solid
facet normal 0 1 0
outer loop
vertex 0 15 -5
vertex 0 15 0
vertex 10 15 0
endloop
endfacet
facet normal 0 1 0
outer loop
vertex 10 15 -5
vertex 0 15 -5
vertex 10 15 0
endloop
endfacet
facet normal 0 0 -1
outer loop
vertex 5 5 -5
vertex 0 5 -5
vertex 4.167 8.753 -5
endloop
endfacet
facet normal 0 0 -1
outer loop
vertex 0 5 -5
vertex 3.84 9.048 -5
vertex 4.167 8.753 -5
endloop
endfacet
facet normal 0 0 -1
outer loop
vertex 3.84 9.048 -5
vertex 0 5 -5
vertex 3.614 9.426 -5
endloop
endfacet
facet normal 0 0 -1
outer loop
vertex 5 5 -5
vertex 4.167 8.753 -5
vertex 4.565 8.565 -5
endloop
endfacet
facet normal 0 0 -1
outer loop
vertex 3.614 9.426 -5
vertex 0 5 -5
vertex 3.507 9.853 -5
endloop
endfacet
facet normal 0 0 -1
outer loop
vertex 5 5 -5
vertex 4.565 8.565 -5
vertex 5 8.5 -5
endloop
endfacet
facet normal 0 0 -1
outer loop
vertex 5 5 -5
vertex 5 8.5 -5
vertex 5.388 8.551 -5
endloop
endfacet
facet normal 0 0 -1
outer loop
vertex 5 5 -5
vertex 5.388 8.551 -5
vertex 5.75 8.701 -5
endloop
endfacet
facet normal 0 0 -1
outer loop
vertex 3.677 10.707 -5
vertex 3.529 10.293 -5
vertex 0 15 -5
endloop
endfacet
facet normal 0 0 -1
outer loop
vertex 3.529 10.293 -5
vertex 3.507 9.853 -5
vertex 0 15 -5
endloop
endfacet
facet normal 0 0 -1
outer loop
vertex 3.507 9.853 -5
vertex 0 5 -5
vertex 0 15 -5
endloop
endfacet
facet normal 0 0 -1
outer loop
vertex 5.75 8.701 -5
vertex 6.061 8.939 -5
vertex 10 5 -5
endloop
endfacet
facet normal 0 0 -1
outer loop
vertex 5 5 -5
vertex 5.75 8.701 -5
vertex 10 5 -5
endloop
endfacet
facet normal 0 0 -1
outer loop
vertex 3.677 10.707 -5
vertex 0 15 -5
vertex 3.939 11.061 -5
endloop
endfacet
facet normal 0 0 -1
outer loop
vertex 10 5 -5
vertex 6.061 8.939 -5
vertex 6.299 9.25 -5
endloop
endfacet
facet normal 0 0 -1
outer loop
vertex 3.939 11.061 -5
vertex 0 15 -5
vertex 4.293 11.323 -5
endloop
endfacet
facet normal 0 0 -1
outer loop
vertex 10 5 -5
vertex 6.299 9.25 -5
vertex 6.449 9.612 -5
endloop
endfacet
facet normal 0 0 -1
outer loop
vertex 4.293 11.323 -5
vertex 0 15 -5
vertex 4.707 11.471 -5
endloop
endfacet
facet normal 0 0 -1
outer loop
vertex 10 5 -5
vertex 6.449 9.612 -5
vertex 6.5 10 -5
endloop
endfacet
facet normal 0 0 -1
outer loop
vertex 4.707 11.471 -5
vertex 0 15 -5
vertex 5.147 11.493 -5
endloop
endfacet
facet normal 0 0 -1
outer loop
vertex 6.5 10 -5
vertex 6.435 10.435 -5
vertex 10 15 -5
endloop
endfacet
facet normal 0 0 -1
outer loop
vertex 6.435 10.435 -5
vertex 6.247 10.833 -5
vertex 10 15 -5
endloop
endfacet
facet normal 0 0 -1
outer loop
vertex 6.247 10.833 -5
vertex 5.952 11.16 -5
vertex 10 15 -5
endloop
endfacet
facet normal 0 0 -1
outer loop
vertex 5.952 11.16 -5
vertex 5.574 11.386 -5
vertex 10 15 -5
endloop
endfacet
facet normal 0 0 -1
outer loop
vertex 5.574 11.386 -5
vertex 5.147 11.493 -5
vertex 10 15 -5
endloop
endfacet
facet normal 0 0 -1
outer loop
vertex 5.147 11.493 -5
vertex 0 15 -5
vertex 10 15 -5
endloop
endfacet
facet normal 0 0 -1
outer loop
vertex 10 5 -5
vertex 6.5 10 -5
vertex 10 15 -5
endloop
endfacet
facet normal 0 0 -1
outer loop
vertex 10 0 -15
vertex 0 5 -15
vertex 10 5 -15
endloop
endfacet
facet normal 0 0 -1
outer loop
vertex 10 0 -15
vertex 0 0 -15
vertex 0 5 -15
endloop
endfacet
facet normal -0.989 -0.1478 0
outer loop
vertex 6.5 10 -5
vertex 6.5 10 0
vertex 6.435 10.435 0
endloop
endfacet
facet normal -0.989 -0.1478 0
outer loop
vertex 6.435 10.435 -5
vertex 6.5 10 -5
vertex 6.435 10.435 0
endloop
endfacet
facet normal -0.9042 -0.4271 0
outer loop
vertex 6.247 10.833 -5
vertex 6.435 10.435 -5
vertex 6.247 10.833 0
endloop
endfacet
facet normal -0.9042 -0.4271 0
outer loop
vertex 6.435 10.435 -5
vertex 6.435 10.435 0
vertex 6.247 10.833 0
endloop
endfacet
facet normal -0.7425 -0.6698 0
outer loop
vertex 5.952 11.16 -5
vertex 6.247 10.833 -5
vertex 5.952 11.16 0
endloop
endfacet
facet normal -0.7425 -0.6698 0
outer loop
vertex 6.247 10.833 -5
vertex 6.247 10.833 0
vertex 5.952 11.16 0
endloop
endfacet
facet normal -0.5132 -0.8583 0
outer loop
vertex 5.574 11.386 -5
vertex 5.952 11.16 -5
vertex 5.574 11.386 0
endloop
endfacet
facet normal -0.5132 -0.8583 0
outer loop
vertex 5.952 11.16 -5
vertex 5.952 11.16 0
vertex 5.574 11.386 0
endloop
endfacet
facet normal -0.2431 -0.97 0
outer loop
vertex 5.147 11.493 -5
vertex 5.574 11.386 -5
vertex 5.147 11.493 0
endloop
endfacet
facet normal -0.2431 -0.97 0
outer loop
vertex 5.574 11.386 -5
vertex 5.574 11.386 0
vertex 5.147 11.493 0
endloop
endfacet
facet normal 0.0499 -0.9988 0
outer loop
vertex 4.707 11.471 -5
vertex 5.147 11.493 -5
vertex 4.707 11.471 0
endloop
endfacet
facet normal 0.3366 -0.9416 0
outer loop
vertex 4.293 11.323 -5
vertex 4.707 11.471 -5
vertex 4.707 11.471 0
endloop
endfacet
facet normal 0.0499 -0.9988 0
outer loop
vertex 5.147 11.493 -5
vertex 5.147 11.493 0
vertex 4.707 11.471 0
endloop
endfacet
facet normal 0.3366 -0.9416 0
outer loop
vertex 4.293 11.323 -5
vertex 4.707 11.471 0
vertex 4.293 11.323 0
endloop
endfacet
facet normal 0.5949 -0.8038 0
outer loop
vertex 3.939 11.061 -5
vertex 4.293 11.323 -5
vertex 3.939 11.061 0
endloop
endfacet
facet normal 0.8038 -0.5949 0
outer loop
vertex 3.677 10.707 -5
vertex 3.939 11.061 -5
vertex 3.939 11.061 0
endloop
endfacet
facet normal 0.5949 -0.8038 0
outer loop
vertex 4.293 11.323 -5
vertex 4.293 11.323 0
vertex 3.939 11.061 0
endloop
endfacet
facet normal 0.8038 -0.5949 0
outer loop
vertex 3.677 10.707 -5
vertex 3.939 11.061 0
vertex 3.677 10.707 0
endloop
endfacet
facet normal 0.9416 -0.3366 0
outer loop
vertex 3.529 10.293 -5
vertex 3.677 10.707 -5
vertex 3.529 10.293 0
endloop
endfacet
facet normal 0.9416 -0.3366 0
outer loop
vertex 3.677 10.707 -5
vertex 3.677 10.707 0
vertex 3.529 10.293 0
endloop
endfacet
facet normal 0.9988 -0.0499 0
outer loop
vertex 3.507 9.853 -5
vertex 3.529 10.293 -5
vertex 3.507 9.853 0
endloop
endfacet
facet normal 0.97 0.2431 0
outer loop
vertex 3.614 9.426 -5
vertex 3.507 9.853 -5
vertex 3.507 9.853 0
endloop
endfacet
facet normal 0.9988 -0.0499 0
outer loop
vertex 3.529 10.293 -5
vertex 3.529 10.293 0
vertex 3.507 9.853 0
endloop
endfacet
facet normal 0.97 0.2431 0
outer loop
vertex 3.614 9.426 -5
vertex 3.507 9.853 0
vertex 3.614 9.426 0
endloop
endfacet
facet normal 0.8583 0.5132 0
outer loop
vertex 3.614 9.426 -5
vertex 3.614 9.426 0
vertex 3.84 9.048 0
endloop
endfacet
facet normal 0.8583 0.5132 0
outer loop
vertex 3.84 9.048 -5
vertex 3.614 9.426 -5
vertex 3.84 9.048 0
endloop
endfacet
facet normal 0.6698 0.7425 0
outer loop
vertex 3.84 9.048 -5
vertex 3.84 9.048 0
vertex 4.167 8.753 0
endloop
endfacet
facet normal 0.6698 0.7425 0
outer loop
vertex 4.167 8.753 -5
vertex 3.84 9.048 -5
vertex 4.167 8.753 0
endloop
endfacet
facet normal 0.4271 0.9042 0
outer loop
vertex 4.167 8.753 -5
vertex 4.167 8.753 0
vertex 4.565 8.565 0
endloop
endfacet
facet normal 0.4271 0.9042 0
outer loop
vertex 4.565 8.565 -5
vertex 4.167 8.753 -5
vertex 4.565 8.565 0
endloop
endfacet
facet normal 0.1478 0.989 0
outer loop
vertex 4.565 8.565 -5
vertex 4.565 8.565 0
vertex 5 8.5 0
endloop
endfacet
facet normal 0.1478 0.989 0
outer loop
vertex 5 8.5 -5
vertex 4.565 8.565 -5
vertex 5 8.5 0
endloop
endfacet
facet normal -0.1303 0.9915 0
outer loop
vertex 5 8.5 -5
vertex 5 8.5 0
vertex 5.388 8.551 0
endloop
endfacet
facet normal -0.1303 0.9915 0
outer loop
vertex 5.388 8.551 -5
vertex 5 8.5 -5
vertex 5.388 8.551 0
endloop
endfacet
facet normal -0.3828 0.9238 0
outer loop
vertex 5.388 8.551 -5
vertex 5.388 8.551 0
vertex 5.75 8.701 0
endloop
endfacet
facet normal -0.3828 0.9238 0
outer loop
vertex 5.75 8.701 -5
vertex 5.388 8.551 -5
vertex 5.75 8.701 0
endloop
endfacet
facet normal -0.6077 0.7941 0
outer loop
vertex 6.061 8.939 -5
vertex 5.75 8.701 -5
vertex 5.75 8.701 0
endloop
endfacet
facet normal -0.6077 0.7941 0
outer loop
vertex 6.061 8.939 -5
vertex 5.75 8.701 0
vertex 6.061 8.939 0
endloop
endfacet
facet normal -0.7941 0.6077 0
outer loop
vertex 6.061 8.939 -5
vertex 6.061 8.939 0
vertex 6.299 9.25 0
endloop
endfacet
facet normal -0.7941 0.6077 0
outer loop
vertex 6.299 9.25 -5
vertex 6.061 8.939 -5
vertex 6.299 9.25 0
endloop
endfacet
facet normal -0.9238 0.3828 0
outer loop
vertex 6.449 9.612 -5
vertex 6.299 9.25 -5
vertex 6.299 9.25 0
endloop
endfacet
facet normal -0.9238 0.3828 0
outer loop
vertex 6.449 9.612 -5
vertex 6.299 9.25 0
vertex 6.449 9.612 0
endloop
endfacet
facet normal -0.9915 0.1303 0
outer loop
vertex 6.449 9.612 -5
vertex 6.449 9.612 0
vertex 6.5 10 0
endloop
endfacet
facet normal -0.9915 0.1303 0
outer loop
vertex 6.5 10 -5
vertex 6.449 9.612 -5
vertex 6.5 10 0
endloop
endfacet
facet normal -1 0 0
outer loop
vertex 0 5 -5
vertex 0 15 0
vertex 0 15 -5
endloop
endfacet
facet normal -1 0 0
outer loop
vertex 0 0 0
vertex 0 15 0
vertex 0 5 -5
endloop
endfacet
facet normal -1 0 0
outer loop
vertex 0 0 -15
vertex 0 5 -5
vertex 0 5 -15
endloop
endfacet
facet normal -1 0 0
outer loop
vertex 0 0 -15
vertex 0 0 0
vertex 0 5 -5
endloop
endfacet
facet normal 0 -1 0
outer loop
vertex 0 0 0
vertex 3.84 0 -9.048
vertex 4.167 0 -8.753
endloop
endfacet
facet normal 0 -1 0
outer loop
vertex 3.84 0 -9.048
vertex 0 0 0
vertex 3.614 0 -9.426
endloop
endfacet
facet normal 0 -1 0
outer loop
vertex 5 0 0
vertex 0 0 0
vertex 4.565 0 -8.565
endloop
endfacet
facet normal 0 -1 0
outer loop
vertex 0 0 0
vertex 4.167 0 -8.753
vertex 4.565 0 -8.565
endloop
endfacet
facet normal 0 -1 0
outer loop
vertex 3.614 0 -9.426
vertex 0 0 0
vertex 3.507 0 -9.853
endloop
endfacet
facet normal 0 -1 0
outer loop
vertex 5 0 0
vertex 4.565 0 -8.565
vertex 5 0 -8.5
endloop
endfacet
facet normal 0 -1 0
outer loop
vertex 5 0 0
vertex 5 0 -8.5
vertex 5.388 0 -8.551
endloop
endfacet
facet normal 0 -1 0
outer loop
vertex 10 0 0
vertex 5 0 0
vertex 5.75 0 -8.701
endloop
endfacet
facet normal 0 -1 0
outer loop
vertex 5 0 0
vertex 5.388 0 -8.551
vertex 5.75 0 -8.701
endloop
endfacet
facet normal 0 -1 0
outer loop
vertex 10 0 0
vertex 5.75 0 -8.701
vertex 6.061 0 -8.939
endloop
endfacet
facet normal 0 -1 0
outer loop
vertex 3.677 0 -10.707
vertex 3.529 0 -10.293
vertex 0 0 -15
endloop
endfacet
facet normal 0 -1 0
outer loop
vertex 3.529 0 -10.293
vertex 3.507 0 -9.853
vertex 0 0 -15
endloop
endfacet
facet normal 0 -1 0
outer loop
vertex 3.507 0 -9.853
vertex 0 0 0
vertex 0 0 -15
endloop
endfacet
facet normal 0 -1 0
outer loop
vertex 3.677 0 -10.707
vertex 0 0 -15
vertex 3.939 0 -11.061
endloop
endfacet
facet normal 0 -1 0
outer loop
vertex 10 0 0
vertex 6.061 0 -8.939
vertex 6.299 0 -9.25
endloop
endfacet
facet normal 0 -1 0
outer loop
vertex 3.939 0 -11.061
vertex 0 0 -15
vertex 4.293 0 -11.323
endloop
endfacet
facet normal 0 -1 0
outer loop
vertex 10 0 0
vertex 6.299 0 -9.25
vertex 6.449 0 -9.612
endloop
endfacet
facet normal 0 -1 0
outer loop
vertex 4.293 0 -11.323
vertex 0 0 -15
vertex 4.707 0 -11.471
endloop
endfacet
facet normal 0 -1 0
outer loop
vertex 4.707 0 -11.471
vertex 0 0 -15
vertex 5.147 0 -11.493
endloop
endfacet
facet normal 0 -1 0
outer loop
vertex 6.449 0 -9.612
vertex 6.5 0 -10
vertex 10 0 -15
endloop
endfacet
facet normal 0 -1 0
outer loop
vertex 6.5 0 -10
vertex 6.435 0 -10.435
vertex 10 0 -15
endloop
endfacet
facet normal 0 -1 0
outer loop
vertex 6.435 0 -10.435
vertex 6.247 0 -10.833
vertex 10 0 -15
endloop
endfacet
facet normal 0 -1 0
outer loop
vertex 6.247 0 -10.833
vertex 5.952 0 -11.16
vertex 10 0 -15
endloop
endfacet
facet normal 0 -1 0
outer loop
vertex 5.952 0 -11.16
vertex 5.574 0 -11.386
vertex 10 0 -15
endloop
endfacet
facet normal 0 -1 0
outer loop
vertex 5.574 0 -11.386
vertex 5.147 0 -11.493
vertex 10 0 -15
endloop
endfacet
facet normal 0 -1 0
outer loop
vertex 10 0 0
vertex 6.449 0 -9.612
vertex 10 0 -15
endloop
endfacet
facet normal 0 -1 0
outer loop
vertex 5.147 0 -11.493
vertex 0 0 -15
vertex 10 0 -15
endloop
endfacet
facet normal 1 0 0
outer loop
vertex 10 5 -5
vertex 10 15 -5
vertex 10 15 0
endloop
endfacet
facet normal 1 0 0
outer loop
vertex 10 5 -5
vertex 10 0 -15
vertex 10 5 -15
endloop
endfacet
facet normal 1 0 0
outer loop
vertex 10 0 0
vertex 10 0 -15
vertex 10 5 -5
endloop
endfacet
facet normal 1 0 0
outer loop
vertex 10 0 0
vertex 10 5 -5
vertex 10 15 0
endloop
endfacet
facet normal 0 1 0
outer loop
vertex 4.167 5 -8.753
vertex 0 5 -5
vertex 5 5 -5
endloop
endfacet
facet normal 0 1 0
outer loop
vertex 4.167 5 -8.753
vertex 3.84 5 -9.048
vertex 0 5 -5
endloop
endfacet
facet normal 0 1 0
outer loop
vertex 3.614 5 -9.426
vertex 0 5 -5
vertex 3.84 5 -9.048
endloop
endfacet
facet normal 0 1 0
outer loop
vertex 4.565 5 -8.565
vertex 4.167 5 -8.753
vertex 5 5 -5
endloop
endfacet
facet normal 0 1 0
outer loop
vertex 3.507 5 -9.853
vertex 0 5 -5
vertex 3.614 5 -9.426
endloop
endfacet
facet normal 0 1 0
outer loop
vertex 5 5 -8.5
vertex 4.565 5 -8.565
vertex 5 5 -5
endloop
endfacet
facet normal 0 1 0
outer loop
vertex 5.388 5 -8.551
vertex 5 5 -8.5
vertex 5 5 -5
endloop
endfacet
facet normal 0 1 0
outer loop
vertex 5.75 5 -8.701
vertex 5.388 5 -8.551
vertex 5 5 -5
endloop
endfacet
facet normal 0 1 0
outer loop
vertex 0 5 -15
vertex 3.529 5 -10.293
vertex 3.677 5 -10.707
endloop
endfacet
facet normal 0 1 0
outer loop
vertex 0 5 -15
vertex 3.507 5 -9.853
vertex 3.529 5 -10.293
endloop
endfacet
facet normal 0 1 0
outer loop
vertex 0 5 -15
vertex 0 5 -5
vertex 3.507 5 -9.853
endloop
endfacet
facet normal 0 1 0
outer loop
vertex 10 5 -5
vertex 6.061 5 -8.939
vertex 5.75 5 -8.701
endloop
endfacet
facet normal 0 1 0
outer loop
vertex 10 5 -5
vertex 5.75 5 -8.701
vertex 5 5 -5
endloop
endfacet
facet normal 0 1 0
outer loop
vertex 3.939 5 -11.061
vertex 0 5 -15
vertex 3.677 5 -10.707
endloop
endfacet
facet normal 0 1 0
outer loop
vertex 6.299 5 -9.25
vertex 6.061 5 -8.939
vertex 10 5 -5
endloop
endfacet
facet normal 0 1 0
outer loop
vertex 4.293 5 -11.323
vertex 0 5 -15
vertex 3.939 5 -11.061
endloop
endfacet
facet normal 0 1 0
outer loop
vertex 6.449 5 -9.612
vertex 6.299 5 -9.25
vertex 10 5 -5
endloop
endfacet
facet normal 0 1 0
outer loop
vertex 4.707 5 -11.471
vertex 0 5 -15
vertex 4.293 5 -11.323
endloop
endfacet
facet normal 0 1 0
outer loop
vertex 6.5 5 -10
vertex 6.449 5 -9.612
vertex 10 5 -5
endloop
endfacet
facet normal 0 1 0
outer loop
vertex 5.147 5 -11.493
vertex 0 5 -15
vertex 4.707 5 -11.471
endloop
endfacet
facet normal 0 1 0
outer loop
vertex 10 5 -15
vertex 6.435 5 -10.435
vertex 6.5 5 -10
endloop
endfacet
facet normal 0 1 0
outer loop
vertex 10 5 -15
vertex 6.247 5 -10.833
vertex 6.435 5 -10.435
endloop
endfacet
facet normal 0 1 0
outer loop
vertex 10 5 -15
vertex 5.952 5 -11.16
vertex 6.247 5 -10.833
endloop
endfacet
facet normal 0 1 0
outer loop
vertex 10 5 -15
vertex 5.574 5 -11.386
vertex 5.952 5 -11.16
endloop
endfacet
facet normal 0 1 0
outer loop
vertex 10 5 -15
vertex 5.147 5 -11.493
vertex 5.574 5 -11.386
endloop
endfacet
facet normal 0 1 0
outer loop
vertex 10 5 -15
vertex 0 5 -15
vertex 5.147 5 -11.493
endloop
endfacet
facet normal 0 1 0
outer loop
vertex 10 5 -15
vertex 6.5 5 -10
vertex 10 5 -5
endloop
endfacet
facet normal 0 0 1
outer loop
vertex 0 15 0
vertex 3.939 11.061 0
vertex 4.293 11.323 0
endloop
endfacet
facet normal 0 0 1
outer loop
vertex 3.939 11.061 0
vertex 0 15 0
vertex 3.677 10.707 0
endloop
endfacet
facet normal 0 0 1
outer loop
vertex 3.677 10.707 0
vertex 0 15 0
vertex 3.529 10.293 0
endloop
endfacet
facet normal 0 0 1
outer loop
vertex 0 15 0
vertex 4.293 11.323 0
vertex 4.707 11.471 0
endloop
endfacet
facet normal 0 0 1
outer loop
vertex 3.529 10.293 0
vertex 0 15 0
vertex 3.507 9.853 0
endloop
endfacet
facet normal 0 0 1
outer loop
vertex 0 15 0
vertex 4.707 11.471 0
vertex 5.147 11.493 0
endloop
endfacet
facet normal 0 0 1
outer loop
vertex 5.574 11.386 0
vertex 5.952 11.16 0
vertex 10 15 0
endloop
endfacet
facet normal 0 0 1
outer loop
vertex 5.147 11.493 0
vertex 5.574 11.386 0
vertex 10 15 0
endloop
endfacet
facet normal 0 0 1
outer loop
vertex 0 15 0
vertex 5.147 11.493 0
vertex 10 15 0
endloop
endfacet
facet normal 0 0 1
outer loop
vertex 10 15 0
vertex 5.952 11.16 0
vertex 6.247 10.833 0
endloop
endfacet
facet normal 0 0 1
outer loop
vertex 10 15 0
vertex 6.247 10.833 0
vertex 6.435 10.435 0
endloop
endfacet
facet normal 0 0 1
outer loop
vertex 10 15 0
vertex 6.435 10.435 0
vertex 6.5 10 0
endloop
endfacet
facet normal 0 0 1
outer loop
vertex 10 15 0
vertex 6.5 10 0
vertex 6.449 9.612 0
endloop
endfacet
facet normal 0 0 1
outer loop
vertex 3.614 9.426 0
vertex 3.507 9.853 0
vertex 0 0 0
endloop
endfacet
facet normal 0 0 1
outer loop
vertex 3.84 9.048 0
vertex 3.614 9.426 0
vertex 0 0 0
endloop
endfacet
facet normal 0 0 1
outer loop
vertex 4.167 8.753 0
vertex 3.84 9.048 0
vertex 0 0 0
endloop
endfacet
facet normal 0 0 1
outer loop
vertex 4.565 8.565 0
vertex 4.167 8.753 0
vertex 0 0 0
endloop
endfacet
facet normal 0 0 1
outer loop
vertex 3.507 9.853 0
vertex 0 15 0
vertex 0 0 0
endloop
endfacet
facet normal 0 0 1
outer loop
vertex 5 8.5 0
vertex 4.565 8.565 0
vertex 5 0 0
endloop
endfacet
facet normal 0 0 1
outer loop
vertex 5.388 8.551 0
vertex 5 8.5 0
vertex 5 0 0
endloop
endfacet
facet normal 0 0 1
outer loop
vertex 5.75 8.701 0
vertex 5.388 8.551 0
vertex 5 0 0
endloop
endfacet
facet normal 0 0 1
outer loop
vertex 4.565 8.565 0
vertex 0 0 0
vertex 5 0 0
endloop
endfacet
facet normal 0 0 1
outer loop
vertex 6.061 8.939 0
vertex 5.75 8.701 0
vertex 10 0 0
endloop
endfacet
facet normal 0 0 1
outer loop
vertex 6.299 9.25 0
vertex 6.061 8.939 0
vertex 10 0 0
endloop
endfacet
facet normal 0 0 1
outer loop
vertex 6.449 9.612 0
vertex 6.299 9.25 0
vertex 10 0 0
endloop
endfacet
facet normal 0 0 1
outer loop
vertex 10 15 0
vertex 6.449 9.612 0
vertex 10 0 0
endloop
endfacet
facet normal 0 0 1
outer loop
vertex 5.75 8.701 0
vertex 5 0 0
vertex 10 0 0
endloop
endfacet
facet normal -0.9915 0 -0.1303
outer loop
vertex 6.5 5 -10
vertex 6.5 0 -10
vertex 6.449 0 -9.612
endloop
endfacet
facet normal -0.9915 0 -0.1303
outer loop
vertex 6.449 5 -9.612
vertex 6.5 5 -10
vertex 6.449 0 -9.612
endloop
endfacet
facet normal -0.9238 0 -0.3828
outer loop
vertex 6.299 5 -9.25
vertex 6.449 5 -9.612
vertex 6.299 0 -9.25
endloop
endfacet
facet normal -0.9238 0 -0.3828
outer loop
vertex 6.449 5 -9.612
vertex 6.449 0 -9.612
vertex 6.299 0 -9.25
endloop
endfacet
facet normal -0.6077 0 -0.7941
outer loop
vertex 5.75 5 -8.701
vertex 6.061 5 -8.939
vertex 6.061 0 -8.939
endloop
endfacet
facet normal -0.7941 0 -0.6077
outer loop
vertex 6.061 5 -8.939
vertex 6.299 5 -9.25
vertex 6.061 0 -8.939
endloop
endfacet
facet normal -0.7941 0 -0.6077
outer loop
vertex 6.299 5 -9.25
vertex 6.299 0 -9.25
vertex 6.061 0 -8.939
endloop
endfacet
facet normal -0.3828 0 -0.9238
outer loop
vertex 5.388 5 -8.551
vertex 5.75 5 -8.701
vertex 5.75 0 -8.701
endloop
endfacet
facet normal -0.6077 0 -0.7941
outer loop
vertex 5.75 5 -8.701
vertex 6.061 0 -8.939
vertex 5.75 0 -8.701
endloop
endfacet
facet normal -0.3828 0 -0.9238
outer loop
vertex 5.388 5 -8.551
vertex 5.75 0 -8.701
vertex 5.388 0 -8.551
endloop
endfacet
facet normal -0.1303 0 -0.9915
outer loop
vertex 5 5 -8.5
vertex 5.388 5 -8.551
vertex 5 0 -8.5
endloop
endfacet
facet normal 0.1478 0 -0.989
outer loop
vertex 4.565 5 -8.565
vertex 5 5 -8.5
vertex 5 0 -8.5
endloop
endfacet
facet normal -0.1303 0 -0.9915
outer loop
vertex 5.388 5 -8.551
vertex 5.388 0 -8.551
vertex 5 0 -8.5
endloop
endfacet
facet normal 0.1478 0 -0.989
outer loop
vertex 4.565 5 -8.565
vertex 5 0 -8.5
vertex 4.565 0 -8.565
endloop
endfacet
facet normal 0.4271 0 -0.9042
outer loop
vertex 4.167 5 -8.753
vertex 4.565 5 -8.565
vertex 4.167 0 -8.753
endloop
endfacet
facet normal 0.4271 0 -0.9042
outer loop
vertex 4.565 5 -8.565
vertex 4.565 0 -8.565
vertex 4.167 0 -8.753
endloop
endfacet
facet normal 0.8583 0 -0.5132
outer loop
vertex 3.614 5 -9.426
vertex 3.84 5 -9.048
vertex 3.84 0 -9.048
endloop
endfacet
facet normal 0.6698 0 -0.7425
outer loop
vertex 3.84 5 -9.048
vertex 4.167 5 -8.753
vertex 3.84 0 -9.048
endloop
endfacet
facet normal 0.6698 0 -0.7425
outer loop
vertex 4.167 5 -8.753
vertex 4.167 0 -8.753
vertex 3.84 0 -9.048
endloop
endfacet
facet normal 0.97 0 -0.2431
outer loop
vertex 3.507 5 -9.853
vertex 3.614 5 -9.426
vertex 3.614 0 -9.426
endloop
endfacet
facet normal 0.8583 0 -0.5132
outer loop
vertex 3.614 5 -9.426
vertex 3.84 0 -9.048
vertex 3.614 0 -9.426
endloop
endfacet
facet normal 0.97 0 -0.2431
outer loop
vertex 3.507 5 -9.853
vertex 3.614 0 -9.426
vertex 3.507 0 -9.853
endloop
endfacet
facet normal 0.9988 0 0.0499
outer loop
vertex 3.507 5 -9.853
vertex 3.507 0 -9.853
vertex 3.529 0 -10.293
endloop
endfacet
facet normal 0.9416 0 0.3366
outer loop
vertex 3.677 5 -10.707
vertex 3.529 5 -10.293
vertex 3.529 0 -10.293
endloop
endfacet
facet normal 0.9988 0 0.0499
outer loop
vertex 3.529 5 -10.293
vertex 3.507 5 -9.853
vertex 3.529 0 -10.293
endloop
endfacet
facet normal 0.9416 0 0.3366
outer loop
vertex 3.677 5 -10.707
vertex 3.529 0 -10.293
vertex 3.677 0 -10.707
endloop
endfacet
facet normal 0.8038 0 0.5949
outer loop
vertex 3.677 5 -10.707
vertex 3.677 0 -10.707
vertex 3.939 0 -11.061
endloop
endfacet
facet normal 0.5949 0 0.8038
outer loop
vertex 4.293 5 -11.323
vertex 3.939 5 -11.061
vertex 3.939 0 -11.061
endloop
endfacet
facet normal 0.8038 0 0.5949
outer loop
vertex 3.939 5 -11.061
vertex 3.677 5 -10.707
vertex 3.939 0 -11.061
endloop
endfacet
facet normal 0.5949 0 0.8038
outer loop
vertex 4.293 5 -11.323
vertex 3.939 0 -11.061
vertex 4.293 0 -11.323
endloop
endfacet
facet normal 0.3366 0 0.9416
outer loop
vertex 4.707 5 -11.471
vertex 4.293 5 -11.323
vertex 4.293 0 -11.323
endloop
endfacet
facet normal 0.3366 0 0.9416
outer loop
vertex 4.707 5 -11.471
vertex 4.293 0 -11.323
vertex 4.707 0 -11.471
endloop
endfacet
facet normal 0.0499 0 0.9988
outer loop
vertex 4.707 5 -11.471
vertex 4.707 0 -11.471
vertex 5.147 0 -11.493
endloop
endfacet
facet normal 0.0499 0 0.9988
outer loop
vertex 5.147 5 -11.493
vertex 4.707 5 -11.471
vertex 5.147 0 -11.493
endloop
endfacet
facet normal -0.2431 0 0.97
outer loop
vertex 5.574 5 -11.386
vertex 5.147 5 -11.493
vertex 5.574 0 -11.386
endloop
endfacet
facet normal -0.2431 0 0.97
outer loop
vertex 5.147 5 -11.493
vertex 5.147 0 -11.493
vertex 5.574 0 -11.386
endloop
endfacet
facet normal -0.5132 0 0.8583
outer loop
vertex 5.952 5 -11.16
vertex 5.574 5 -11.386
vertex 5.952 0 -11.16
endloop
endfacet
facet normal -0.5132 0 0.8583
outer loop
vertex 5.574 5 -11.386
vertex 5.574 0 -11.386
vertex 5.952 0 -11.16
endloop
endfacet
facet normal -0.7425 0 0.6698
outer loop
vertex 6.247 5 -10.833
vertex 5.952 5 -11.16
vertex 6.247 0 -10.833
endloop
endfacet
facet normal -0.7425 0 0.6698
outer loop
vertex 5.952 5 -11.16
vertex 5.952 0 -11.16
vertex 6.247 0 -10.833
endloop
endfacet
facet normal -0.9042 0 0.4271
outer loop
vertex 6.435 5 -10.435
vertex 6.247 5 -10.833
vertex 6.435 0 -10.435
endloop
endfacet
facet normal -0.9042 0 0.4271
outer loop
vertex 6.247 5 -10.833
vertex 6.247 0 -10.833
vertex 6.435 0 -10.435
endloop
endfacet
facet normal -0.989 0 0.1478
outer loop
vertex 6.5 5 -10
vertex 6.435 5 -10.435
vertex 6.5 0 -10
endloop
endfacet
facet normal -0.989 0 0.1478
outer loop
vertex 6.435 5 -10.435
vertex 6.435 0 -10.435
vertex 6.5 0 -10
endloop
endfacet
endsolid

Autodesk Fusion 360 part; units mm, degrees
sketch "Sketch1" plane through (0, 0, 0) normal (0, 1, 0) x (1, 0, 0)
  line L0 (0, 0) -> (10, 0)
  line L1 (5, 0) -> (5, 10)
  line L2 (0, 0) -> (0, 15)
  line L3 (0, 15) -> (10, 15)
  line L4 (10, 15) -> (10, 0)
  circle A0 centre (5, 10) radius 1.5
  dimension "d1" = 3
extrude "Extrude1" add sketch "Sketch1" along normal blind 5
sketch "Sketch2" plane through (0, 0, 0) normal (0, 0, 1) x (1, 0, 0)
  line L0 (0, 0) -> (10, 0)
  line L1 (10, 0) -> (10, 5)
  line L2 (10, 5) -> (0, 5)
  line L3 (0, 5) -> (0, 0)
  line L4 (5, 0) -> (5, 10)
  line L5 (0, 5) -> (0, 15)
  line L6 (0, 15) -> (10, 15)
  line L7 (10, 15) -> (10, 5)
  circle A0 centre (5, 10) radius 1.5
  dimension "d4" = 10
  dimension "d5" = 3
extrude "Extrude2" add sketch "Sketch2" against normal blind 5 contours L2 L5 L6 L7
